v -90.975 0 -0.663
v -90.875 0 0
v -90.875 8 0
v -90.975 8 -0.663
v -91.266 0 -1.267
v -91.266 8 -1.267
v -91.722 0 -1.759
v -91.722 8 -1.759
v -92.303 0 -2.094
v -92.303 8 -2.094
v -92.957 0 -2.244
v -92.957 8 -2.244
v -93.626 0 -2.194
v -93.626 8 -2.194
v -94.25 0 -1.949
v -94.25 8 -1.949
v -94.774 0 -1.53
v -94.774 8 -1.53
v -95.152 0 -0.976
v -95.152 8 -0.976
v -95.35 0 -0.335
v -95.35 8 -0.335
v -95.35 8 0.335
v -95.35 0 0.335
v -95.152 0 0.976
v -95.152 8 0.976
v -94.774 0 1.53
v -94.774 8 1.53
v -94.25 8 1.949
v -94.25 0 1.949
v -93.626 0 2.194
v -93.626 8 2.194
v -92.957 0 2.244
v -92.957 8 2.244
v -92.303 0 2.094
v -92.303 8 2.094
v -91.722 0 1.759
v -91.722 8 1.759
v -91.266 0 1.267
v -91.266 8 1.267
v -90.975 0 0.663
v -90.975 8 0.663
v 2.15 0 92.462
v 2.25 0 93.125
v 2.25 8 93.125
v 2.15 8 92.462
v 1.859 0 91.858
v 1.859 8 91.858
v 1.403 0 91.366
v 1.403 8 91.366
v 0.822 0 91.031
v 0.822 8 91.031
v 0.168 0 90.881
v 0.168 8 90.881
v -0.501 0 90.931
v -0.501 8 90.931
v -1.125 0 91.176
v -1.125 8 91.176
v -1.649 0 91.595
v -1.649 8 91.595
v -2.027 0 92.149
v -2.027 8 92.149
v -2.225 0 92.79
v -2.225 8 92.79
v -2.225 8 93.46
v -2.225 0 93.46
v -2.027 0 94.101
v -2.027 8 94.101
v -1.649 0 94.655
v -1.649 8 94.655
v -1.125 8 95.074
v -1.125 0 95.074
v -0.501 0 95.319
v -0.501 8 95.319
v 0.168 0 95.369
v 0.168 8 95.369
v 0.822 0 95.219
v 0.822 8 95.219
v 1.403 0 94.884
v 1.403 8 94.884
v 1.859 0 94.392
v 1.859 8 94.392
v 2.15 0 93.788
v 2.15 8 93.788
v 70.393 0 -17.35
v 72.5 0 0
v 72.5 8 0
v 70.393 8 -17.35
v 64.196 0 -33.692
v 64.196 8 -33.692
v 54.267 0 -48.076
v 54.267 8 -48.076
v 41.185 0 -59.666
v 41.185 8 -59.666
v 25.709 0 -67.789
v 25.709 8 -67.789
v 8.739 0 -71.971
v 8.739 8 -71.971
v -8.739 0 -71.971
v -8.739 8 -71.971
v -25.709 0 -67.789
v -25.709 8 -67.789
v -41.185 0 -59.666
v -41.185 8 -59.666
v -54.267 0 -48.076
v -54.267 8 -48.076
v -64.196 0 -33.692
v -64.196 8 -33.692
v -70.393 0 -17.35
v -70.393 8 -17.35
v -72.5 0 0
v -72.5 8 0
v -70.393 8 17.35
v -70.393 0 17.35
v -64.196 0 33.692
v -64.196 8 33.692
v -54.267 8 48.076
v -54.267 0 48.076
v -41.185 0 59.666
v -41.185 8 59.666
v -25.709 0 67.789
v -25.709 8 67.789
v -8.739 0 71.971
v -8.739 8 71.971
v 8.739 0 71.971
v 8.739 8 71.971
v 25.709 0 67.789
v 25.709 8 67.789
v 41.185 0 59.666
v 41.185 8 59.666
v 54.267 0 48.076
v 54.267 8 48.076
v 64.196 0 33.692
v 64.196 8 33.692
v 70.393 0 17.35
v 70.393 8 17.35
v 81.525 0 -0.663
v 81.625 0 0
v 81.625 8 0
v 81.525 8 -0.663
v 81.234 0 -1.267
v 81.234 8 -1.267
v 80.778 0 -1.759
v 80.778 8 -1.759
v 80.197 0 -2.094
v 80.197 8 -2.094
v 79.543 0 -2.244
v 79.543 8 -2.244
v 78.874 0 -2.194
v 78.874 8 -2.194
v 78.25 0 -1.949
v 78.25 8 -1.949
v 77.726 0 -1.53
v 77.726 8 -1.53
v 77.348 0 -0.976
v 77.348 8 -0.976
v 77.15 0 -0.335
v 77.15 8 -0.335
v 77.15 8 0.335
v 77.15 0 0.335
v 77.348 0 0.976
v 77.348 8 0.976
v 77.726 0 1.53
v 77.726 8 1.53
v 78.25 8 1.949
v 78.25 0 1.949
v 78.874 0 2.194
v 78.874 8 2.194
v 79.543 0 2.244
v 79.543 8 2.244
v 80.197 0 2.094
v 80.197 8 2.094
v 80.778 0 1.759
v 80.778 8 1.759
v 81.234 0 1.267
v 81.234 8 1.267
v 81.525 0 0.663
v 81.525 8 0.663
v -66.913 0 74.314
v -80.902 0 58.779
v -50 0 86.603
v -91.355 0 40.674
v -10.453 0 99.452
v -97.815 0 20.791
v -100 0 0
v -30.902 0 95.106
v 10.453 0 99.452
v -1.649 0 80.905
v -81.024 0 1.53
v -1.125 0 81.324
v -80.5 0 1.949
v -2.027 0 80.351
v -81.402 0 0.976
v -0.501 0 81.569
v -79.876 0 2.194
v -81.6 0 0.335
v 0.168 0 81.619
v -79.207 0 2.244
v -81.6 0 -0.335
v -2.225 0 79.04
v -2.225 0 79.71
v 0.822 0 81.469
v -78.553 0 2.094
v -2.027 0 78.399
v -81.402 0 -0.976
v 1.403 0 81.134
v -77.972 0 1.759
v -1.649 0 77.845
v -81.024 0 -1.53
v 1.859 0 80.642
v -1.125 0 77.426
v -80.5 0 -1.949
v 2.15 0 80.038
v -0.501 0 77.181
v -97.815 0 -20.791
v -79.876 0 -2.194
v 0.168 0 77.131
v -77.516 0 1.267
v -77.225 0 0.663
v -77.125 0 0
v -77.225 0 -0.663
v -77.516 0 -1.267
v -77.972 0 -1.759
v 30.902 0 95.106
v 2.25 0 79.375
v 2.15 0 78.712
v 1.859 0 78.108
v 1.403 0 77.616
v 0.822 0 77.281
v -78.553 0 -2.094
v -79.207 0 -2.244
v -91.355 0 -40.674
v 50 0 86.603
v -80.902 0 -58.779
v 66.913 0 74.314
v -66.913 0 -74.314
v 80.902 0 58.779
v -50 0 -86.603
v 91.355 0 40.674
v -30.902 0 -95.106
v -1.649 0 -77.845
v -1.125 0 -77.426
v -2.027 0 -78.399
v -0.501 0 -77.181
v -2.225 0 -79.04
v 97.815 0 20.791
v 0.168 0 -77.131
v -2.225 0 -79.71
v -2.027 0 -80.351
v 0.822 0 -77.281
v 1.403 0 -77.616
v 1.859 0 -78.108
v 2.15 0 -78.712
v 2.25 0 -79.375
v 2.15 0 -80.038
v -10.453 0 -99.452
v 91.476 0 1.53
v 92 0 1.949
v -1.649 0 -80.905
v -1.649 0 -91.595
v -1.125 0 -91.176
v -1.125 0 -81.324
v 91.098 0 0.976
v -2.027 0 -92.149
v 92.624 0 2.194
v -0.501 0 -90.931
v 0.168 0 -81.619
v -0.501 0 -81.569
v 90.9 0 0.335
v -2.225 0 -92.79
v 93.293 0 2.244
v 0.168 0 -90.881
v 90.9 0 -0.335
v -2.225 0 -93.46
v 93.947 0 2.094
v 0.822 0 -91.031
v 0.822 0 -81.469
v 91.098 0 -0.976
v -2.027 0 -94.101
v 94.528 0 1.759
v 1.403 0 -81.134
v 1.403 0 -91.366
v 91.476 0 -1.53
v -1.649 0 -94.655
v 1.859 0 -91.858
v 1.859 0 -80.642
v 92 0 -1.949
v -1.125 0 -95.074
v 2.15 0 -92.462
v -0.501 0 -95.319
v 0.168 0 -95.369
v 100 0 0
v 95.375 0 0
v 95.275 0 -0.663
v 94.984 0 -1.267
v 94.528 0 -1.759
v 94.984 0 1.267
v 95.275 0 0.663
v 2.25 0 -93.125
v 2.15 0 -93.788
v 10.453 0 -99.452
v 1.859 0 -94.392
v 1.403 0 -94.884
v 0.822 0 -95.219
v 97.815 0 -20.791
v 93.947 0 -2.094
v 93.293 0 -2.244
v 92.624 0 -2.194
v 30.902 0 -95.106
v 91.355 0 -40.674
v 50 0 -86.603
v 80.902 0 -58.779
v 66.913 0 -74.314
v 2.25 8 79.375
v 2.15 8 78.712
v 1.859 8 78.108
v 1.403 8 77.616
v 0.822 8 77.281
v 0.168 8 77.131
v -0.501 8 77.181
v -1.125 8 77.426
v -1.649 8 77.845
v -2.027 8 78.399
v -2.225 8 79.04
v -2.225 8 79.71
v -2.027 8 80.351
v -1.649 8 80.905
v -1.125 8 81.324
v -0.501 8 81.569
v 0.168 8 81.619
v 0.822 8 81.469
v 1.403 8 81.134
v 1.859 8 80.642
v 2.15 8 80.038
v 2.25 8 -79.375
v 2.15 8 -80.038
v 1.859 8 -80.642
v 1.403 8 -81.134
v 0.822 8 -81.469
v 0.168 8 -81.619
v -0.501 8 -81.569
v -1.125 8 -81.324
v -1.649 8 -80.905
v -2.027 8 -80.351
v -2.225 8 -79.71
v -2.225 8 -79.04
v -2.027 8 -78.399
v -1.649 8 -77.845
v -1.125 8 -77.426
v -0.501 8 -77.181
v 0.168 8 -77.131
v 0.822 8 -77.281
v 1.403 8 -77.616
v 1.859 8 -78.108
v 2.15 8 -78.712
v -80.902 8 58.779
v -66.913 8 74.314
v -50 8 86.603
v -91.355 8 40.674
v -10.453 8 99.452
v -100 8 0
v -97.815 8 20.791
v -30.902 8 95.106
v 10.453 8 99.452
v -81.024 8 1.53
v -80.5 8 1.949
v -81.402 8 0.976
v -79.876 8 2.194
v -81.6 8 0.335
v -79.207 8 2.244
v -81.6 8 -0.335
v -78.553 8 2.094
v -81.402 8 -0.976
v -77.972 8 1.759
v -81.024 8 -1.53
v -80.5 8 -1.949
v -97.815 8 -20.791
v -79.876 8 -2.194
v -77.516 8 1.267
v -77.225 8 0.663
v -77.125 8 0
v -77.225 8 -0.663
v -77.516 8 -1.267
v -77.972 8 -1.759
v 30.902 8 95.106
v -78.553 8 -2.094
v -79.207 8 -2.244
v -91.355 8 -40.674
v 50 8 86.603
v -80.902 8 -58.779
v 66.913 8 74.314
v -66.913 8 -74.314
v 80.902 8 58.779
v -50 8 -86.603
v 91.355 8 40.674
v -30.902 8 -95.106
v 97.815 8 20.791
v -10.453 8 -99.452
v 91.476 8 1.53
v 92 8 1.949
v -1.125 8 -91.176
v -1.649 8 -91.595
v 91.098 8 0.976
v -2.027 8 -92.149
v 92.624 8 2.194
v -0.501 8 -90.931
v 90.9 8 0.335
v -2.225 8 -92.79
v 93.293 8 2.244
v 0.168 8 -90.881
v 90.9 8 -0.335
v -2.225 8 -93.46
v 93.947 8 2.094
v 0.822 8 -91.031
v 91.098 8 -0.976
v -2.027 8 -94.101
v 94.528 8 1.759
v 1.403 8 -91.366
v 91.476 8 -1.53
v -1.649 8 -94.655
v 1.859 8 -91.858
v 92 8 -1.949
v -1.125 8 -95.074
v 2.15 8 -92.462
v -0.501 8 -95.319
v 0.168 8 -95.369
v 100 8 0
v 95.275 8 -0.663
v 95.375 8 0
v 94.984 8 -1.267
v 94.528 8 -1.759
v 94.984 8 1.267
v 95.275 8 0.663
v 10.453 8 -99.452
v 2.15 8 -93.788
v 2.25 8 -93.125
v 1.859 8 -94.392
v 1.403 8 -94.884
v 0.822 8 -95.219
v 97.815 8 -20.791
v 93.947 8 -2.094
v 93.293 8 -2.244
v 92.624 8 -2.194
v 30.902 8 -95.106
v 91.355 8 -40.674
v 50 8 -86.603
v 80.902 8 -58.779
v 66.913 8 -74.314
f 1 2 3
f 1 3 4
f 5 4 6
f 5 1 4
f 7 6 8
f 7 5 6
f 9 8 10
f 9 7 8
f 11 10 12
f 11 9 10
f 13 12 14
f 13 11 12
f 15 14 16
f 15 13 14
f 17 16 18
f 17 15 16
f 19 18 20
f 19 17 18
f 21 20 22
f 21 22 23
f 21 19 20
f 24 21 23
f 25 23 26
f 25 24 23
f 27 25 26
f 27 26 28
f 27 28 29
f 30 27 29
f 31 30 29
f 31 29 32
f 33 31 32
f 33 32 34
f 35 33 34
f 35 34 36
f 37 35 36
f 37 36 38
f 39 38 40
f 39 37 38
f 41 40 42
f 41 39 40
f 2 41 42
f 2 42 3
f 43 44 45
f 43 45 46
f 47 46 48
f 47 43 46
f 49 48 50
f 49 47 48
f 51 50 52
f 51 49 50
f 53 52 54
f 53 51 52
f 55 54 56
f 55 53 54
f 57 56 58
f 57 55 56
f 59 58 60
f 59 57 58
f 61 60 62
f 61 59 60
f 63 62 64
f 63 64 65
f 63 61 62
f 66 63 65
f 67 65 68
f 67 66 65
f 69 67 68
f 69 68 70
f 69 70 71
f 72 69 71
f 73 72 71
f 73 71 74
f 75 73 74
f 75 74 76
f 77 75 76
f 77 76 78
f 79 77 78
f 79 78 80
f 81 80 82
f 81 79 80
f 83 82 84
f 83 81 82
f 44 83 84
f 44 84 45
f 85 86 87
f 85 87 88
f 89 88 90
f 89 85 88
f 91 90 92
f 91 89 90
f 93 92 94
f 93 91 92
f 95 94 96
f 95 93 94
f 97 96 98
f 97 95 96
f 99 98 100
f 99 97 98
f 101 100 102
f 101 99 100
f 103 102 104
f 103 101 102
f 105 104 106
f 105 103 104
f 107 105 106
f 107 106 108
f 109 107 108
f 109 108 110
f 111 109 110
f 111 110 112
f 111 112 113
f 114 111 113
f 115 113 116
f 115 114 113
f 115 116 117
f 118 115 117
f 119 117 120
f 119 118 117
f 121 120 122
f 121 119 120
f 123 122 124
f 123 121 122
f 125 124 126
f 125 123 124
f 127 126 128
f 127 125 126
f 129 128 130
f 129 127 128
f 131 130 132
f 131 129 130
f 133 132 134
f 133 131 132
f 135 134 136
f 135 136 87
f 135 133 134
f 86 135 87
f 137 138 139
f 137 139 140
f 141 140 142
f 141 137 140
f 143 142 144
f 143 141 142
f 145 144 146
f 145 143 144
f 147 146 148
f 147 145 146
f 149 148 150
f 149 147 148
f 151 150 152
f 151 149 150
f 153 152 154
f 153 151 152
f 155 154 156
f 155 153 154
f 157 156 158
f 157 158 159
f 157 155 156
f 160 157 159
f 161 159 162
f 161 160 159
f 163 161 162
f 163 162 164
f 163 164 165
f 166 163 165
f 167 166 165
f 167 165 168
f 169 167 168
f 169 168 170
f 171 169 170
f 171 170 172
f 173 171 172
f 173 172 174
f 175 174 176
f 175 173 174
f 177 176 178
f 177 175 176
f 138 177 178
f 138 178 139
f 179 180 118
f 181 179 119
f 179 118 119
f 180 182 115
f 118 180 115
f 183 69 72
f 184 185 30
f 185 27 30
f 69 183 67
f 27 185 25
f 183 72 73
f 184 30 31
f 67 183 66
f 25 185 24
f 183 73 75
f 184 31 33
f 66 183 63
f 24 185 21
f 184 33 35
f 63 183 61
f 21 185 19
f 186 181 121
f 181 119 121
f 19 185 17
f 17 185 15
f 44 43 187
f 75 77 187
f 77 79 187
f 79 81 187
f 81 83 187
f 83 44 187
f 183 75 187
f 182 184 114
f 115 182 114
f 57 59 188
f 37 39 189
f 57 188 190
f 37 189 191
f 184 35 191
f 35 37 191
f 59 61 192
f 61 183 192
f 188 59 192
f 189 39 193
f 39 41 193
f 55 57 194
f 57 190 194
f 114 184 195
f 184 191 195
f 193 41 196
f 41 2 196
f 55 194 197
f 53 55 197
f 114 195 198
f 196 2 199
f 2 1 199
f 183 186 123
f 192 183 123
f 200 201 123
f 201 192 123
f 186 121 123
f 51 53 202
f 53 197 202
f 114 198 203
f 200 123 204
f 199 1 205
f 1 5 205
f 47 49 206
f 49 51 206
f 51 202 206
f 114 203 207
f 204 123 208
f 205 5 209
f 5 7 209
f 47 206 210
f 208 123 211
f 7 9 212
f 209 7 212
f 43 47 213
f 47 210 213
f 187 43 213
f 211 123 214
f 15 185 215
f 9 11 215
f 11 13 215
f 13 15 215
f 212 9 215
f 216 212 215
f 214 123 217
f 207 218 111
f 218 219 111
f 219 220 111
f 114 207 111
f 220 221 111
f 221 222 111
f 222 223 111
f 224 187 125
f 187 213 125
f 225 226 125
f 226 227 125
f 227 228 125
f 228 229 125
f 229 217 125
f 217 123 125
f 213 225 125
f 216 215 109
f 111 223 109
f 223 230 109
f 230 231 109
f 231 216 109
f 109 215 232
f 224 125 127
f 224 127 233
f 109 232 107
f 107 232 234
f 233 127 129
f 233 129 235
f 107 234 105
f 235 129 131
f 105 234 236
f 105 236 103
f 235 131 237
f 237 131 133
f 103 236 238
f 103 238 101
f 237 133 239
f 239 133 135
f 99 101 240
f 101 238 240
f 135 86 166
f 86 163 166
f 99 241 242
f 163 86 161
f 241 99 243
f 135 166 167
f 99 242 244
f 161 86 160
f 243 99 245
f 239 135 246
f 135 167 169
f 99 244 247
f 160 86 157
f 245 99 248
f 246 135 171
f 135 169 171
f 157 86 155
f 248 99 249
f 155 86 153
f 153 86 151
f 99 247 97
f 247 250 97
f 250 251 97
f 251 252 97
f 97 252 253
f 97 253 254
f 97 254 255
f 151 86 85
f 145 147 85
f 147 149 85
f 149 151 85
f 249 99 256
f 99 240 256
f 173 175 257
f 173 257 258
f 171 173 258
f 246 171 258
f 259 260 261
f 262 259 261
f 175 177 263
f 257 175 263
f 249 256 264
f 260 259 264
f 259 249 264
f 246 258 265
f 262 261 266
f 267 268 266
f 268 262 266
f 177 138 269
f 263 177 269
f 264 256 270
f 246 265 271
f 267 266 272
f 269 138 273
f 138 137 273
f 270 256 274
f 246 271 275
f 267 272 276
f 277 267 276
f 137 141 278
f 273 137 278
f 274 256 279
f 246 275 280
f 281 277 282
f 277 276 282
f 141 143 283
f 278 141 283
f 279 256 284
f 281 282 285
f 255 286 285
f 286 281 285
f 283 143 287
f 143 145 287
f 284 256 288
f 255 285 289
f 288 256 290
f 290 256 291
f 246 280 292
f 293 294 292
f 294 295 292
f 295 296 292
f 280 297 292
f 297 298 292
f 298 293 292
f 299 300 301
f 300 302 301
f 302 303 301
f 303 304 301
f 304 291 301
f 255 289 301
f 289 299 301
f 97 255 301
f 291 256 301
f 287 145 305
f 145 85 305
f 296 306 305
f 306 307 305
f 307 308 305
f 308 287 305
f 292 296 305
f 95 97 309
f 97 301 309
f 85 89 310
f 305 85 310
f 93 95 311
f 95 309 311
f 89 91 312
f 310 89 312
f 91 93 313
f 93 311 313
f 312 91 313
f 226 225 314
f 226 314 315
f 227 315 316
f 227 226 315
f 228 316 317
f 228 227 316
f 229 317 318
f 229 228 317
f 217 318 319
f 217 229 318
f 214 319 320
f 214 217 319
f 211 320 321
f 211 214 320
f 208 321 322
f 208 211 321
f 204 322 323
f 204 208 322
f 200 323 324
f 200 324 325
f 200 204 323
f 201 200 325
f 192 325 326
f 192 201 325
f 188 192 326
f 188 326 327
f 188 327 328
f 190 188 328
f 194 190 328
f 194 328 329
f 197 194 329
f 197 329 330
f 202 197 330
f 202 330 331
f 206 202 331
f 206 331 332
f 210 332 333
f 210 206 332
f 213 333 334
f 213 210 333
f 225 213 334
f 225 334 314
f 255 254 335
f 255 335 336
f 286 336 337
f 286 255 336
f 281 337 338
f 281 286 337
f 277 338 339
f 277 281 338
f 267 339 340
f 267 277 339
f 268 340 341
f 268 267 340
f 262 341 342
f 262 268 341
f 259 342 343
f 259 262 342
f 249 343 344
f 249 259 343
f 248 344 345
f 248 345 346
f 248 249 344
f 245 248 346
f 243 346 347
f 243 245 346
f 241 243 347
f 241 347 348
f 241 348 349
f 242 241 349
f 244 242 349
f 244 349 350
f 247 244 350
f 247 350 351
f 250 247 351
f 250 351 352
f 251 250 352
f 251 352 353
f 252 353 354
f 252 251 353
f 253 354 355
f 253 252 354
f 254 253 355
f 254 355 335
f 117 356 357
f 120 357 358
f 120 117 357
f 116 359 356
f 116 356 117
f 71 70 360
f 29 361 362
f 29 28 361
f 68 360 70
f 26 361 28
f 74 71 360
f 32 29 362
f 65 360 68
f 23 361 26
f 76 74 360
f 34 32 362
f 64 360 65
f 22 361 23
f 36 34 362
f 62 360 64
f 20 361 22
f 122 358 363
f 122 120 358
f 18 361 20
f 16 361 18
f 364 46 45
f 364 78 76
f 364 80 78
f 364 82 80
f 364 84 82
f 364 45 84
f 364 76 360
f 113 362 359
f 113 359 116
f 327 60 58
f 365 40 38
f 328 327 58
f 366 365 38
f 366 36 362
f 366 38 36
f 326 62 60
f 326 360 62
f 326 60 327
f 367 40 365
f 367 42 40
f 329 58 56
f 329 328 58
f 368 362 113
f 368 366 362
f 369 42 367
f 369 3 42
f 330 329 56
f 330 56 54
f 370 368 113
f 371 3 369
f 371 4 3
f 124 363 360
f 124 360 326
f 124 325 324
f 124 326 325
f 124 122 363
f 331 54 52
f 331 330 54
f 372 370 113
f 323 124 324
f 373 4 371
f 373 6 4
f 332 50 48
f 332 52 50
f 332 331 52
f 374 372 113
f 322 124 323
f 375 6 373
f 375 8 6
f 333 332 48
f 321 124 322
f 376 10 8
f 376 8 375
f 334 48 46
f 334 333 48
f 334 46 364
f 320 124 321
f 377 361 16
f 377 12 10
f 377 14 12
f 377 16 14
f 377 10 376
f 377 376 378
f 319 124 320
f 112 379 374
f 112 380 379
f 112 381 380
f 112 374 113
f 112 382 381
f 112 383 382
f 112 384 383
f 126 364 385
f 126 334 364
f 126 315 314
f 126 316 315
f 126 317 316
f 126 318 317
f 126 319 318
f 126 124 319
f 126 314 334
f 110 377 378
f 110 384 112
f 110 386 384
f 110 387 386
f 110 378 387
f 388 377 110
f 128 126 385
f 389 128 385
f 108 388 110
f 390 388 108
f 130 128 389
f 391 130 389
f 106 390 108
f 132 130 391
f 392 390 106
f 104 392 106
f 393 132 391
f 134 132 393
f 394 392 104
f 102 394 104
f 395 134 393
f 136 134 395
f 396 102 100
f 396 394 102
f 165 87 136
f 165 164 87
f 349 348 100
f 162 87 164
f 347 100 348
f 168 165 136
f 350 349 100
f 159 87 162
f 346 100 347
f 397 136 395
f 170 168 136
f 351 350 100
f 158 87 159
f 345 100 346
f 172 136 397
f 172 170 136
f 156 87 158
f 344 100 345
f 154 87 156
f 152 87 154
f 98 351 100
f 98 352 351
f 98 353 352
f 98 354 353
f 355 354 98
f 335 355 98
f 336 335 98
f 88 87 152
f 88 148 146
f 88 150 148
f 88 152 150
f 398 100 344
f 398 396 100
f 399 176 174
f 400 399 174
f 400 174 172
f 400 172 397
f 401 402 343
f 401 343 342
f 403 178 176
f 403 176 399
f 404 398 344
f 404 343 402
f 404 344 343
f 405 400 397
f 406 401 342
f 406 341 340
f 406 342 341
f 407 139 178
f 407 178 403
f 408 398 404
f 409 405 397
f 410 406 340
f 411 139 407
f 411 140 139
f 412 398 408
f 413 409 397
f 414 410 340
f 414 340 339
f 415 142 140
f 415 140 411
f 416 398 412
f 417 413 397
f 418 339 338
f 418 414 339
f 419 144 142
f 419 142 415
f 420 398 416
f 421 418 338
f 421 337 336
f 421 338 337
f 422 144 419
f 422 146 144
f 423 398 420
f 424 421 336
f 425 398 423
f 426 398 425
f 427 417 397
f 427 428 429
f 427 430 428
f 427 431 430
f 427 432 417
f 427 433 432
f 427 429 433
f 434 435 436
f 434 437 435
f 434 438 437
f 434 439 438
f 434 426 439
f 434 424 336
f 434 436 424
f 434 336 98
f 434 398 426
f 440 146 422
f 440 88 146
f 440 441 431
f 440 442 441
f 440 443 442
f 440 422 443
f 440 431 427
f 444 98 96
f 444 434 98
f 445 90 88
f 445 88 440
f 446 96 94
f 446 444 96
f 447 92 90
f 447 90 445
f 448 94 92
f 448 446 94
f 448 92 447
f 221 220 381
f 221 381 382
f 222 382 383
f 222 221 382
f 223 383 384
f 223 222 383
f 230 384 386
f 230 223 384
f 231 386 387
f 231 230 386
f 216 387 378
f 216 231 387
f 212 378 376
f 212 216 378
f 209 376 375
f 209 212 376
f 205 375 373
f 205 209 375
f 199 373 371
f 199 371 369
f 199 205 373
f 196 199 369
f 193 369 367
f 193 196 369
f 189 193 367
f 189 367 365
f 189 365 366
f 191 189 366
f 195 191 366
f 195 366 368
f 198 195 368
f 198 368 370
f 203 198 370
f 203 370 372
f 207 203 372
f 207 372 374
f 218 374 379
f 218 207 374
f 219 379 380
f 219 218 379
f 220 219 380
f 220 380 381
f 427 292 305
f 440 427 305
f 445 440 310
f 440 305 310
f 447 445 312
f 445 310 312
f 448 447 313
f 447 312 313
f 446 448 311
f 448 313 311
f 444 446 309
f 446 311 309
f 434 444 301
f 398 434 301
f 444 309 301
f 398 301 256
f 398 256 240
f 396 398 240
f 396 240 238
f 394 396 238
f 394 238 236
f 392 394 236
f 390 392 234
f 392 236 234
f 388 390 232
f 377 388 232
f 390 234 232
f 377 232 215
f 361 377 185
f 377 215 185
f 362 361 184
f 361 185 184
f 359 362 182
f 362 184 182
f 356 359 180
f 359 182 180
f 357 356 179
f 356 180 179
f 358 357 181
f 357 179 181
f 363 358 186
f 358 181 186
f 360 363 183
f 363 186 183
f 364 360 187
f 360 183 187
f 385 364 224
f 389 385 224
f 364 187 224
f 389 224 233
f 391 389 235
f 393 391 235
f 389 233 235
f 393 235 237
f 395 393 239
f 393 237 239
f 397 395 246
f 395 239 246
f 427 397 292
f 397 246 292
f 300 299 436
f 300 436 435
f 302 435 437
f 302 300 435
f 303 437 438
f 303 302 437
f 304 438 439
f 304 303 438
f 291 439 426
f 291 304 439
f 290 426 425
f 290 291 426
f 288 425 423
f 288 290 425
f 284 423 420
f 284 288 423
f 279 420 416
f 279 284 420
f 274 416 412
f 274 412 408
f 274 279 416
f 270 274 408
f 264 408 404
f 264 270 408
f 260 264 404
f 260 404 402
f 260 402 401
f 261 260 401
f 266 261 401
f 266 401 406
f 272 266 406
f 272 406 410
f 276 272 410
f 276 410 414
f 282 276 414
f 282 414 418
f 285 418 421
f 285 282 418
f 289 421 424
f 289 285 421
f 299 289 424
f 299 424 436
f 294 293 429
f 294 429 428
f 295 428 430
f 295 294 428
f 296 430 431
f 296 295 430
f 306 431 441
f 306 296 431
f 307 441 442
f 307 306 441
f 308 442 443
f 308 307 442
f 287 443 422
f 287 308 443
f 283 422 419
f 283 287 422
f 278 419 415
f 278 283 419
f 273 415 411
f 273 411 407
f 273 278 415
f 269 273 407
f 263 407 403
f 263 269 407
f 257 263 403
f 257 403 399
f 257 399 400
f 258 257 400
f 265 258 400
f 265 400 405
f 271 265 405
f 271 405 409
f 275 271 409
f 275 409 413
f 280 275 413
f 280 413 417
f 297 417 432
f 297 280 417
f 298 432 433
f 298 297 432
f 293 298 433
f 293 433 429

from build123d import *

# Parameters (mm, degrees)
SKETCH1_R           = 100
SKETCH1_R_2         = 72.5
BOSS_EXTRUDE1_DEPTH = 8
SKETCH2_R           = 2.25
CUT_EXTRUDE1_DEPTH  = 8


with BuildPart() as part:
    # Sketch1 → Boss-Extrude1 (new body)
    with BuildSketch(Plane(origin=(0, 0, 0), x_dir=(1, 0, 0), z_dir=(0, 1, 0))):
        Circle(SKETCH1_R)
        Circle(SKETCH1_R_2, mode=Mode.SUBTRACT)
    extrude(amount=BOSS_EXTRUDE1_DEPTH)

    # Sketch2 → Cut-Extrude1 (cut)
    with BuildSketch(Plane(origin=(0, 0, 0), x_dir=(1, 0, 0), z_dir=(0, 1, 0))):
        with Locations((0, 93.125)):
            Circle(SKETCH2_R)
        with Locations((93.125, 0)):
            Circle(SKETCH2_R)
        with Locations((0, -93.125)):
            Circle(SKETCH2_R)
        with Locations((-93.125, 0)):
            Circle(SKETCH2_R)
        with Locations((0, 79.375)):
            Circle(SKETCH2_R)
        with Locations((79.375, 0)):
            Circle(SKETCH2_R)
        with Locations((0, -79.375)):
            Circle(SKETCH2_R)
        with Locations((-79.375, 0)):
            Circle(SKETCH2_R)
    extrude(amount=CUT_EXTRUDE1_DEPTH, mode=Mode.SUBTRACT)


solid = part.part
